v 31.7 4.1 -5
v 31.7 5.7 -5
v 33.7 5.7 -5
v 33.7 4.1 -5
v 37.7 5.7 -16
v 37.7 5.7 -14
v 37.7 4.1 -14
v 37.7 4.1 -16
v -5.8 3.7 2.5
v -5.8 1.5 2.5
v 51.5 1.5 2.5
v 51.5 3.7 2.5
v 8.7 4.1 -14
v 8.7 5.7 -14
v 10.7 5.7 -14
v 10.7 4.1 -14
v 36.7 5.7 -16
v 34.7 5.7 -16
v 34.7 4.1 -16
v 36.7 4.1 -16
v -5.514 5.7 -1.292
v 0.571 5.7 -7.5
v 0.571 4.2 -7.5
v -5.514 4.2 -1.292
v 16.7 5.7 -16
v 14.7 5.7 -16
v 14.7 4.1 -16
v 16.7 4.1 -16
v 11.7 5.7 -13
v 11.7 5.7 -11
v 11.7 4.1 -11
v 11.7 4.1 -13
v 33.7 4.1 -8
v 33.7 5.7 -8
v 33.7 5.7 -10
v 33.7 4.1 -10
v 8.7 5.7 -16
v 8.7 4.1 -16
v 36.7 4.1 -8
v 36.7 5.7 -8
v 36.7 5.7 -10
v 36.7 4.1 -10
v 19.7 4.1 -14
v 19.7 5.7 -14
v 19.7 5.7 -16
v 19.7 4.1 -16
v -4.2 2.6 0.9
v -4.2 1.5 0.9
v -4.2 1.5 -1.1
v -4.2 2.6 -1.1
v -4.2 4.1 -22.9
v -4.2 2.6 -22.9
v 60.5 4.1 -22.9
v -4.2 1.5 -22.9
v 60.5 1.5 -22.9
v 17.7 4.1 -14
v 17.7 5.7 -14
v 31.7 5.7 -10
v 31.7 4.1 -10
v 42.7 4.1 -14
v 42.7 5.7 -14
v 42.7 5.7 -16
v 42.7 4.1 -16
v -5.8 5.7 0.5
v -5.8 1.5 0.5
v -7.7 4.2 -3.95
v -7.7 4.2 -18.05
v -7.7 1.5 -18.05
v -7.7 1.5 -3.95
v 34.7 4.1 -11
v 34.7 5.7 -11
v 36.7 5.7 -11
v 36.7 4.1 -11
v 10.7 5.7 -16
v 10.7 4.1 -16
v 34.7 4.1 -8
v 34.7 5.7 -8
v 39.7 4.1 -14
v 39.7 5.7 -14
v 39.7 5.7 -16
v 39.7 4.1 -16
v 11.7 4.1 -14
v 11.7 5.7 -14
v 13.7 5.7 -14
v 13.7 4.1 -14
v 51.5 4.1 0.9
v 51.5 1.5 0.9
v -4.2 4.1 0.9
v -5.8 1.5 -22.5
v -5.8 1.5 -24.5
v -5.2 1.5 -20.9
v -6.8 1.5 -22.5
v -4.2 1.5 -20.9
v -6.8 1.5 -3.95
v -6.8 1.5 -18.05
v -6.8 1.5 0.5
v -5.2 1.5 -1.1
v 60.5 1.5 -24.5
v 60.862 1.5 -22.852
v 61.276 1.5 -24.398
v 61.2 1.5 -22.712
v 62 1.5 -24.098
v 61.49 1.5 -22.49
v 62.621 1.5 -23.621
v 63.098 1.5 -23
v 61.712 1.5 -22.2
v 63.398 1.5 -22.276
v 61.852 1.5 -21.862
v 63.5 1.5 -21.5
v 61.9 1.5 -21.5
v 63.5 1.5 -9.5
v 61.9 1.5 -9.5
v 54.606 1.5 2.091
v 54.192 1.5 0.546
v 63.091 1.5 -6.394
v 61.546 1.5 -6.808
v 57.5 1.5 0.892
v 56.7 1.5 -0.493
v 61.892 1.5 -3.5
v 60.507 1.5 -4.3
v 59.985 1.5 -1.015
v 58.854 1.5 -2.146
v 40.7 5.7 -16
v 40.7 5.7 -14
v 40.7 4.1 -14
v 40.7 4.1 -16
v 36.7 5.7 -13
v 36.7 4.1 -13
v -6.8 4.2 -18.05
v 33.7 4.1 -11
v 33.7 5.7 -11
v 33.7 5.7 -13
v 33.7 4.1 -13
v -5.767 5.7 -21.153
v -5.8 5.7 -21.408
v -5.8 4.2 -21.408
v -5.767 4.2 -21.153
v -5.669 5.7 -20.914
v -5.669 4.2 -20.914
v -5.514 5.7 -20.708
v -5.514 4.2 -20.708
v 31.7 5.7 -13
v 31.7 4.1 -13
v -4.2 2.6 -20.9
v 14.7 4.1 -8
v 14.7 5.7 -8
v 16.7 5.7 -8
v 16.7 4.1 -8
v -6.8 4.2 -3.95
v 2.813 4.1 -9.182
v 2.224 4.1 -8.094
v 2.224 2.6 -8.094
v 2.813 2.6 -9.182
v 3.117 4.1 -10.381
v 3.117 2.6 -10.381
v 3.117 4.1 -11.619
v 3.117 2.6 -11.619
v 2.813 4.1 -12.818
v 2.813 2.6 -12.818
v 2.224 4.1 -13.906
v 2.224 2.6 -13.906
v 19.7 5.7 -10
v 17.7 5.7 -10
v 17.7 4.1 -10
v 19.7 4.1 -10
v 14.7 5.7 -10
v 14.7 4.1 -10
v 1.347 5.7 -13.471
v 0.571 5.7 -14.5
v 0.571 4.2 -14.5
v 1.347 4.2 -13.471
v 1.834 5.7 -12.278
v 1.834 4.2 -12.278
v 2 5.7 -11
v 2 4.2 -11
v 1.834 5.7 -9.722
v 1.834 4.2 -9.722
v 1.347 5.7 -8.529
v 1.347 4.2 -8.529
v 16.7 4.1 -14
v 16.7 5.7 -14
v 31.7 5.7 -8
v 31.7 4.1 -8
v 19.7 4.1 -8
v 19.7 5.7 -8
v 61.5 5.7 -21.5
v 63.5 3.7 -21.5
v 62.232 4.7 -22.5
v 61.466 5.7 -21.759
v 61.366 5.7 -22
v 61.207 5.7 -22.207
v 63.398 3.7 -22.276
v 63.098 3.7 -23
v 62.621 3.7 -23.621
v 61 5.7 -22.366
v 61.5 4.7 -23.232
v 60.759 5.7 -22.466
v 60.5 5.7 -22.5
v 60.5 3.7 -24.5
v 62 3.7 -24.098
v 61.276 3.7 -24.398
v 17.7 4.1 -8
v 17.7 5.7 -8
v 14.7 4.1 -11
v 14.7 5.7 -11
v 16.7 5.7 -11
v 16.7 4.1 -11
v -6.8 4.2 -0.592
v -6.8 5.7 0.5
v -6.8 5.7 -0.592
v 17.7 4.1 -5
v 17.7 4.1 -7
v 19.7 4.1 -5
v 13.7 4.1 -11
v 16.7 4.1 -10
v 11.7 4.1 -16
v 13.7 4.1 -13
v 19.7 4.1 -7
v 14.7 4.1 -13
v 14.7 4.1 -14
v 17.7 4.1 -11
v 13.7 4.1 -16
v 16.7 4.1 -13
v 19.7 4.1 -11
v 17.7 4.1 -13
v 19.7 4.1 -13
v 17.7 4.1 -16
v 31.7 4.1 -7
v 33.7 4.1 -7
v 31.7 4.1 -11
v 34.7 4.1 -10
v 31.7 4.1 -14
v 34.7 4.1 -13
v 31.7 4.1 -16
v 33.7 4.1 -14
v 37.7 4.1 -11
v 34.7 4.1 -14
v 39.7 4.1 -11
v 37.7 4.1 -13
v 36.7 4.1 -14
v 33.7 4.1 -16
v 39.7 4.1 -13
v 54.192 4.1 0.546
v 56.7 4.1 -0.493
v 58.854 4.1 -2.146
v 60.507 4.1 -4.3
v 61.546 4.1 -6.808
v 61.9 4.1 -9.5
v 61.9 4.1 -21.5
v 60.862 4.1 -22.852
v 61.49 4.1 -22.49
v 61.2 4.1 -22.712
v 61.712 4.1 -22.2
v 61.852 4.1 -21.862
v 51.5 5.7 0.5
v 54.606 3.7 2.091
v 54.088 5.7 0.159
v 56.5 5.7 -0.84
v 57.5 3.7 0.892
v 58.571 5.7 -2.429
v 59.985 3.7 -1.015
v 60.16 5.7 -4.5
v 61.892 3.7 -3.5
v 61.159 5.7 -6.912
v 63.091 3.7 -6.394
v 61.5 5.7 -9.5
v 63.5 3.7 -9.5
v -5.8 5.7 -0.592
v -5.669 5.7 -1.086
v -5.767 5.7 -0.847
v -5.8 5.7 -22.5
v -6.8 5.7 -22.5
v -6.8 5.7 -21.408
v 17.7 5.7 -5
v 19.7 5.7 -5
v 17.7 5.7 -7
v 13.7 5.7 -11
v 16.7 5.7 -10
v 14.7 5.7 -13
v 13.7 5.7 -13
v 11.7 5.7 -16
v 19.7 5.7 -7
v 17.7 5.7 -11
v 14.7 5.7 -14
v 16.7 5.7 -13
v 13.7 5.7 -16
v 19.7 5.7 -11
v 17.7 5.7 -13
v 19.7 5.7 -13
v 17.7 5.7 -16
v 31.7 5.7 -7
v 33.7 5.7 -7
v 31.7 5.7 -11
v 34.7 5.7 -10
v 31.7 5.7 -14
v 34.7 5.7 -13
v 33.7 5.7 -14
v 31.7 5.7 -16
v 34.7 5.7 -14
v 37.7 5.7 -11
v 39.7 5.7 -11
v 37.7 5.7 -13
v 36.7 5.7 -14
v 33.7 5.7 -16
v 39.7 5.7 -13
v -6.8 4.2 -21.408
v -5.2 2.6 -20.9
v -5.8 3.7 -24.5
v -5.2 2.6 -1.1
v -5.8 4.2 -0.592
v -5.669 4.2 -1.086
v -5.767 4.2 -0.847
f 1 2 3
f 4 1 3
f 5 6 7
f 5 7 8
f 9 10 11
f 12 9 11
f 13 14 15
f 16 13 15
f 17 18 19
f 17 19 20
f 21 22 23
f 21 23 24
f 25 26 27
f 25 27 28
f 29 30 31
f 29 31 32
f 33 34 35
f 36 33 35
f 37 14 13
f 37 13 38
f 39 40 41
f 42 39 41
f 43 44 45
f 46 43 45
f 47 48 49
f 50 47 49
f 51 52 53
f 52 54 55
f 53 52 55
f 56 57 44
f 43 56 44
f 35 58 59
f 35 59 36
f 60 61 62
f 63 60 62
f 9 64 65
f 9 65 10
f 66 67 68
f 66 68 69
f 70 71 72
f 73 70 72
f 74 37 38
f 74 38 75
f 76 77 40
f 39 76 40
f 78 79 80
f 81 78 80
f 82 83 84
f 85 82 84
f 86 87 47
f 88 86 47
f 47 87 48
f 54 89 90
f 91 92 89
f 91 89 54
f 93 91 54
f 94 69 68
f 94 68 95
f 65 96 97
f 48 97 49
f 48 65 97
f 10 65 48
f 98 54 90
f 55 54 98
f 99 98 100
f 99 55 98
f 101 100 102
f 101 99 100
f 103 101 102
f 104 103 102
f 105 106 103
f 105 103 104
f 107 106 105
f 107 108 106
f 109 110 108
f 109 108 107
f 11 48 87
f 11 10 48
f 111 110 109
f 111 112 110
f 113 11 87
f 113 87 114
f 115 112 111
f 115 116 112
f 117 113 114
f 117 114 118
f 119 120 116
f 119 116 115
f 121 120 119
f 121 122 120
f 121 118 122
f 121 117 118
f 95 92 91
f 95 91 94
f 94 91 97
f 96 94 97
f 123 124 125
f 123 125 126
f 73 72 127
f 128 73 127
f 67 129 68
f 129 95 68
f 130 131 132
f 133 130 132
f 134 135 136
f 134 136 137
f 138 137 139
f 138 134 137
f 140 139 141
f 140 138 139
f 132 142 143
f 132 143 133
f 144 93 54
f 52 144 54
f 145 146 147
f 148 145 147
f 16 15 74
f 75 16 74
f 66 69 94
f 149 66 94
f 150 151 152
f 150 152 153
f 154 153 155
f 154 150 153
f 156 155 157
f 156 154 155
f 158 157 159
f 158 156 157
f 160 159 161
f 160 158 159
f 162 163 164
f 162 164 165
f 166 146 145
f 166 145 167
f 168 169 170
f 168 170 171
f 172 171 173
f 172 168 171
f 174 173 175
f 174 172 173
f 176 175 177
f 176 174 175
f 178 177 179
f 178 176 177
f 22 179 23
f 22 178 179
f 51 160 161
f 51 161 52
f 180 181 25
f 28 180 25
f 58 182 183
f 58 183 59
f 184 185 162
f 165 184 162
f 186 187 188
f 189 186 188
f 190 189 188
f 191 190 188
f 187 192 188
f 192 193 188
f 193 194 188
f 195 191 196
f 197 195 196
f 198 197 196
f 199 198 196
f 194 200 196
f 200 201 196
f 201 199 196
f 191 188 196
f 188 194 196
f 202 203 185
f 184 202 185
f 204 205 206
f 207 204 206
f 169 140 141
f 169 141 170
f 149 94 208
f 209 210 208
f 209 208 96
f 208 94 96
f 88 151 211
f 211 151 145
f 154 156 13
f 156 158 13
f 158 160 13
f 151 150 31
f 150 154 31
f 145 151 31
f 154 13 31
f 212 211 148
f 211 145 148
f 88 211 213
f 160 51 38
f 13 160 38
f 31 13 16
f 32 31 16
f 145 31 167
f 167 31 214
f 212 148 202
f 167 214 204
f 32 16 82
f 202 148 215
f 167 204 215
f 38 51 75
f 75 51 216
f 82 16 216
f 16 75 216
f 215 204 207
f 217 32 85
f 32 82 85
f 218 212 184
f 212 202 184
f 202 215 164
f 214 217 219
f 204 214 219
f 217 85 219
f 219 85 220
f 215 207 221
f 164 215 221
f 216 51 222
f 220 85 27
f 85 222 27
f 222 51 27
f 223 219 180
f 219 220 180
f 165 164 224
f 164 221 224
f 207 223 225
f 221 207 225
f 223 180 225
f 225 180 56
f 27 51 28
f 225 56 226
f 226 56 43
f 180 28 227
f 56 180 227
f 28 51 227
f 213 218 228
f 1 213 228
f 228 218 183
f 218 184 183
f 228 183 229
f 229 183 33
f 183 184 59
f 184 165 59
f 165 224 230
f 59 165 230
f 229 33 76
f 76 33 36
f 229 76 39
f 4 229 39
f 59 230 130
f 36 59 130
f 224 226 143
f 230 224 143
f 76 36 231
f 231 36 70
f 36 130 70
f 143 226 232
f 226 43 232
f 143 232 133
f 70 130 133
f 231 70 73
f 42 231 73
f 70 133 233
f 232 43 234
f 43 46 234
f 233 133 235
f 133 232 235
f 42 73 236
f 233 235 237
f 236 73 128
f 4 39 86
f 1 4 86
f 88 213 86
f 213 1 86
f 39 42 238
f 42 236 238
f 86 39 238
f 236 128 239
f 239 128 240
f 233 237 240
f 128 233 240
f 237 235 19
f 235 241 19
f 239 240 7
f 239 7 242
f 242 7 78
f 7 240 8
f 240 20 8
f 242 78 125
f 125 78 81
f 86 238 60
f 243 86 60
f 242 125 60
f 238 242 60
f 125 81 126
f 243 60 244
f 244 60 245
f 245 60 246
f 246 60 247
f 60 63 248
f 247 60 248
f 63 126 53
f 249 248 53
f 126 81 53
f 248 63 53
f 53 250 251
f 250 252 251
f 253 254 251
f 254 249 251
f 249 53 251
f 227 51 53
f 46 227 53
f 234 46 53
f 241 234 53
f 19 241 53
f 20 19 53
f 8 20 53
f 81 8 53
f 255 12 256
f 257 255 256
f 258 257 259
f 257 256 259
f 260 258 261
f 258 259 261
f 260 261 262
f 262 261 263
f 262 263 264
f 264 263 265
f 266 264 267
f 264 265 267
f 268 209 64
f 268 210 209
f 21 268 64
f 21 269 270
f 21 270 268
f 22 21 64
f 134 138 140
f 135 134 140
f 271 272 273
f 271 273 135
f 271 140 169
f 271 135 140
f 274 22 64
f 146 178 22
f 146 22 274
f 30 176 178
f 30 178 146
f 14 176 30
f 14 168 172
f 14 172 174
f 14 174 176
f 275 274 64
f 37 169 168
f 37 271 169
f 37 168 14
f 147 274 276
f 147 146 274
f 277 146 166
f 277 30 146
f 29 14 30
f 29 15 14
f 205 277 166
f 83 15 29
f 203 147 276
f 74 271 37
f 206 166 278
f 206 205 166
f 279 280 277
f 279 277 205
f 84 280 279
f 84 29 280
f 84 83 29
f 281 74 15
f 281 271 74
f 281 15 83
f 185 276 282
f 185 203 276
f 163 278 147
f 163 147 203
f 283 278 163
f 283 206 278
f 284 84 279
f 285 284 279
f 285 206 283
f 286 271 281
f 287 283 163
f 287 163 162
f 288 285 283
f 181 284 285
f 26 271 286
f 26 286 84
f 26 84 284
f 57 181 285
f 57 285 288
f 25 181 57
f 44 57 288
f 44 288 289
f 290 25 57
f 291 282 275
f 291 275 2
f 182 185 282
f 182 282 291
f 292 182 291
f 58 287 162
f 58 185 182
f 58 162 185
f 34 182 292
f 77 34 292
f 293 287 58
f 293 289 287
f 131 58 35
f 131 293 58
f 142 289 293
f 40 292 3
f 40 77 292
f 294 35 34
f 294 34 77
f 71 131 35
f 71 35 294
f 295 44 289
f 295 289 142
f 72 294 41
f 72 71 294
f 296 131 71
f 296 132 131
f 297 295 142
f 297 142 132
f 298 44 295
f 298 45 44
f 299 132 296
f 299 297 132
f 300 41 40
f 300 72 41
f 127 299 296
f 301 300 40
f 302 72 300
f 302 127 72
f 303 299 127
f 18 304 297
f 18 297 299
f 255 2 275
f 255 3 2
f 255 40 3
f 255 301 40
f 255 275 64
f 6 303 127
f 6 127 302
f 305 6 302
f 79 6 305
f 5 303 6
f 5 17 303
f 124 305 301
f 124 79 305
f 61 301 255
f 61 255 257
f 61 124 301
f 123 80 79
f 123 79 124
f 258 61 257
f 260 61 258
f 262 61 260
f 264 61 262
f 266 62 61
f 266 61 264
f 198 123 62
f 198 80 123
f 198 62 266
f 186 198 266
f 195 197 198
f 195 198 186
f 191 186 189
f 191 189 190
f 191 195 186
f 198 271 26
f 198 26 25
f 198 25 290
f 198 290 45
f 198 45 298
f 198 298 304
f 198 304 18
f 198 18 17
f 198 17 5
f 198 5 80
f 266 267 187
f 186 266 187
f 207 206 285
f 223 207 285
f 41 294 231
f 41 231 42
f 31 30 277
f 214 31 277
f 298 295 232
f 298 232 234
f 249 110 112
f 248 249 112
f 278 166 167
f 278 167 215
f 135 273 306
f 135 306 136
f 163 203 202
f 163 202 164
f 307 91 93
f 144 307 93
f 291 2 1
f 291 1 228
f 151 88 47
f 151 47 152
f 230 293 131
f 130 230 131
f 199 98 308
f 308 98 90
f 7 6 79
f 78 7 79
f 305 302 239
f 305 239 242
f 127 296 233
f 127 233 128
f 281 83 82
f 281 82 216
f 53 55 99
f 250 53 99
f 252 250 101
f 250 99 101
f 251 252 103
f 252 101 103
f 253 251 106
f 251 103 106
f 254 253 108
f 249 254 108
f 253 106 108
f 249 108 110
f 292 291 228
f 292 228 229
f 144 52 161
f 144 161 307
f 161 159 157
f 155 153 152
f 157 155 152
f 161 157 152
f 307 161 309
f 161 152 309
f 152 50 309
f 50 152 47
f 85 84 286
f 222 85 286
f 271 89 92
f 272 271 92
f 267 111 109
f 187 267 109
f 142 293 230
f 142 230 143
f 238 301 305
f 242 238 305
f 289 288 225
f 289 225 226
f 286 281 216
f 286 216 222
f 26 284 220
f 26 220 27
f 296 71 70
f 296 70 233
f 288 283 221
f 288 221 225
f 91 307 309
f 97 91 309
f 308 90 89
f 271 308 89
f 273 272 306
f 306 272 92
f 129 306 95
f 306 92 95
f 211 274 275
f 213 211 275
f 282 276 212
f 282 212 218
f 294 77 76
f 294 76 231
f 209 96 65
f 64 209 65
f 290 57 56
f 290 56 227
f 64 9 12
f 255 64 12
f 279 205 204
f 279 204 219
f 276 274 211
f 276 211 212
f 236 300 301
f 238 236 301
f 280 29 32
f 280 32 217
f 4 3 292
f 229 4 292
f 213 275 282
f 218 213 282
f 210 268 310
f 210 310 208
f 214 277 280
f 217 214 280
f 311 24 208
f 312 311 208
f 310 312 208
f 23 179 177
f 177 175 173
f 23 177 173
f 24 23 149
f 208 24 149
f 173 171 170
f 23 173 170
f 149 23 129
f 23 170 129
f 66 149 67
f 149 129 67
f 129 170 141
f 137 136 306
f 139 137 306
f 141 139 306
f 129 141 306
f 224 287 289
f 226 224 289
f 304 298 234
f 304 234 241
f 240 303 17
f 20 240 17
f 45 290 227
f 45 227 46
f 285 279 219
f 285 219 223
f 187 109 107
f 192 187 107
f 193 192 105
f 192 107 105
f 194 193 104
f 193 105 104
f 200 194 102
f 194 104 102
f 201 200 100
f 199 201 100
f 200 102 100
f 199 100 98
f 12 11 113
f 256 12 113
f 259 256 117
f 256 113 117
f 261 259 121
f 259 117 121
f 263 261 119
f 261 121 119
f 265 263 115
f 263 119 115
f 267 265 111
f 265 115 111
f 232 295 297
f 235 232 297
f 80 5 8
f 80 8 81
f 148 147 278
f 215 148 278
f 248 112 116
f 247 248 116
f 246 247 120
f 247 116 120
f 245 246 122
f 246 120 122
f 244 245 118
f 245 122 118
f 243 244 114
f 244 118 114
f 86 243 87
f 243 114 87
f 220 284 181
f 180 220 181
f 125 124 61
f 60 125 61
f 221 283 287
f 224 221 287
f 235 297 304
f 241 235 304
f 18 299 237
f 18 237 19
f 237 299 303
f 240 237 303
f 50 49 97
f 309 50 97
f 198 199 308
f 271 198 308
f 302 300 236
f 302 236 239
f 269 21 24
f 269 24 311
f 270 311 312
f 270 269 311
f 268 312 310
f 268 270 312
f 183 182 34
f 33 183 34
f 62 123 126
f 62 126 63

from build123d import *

# Parameters (mm, degrees)
EXTRUDE_1_DEPTH     = 4.2
EXTRUDE_START       = -1.6
EXTRUDE_2_DEPTH     = 1.6
CHAMFER_1_SIZE      = 2
CUT_EXTRUDE_1_DEPTH = 1.5
EXTRUDE_3_DEPTH     = 1.5
SKETCH_5_W          = 2.5
SKETCH_5_H          = 12.1
EXTRUDE_4_DEPTH     = 1.1
SKETCH_6_W          = 2
SKETCH_6_H          = 2
CUT_EXTRUDE_2_DEPTH = 69.191935007


with BuildPart() as part:
    # Эскиз1 → Бобышка-Вытянуть1 (new body)
    with BuildSketch(Plane(origin=(0, 1.5, 0), x_dir=(1, 0, 0), z_dir=(0, 1, 0))):
        with BuildLine():
            Line((46.05, -0.9), (-4.2, -0.9))
            Line((-4.2, -0.9), (-4.2, 1.1))
            Line((-4.2, 1.1), (-5.2, 1.1))
            Line((-5.2, 1.1), (-5.2, 4.95))
            Line((-5.2, 4.95), (-7.7, 4.95))
            Line((-7.7, 4.95), (-7.7, 3.95))
            Line((-7.7, 3.95), (-6.8, 3.95))
            Line((-6.8, 3.95), (-6.8, -0.5))
            Line((-6.8, -0.5), (-5.8, -0.5))
            Line((-5.8, -0.5), (-5.8, -2.5))
            Line((-5.8, -2.5), (46.05, -2.5))
            Line((46.05, -2.5), (50.55, -2.5))
            Line((50.55, -2.5), (51.5, -2.5))
            ThreePointArc((51.5, -2.5), (59.985281374, 1.014718626), (63.5, 9.5))
            Line((63.5, 9.5), (63.5, 21.5))
            ThreePointArc((63.5, 21.5), (62.621320344, 23.621320344), (60.5, 24.5))
            Line((60.5, 24.5), (-5.8, 24.5))
            Line((-5.8, 24.5), (-5.8, 22.5))
            Line((-5.8, 22.5), (-6.8, 22.5))
            Line((-6.8, 22.5), (-6.8, 18.05))
            Line((-6.8, 18.05), (-7.7, 18.05))
            Line((-7.7, 18.05), (-7.7, 17.05))
            Line((-7.7, 17.05), (-5.2, 17.05))
            Line((-5.2, 17.05), (-5.2, 20.9))
            Line((-5.2, 20.9), (-4.2, 20.9))
            Line((-4.2, 20.9), (-4.2, 22.9))
            Line((-4.2, 22.9), (60.5, 22.9))
            ThreePointArc((60.5, 22.9), (61.489949494, 22.489949494), (61.9, 21.5))
            Line((61.9, 21.5), (61.9, 9.5))
            ThreePointArc((61.9, 9.5), (58.853910524, 2.146089476), (51.5, -0.9))
            Line((51.5, -0.9), (50.55, -0.9))
            Line((50.55, -0.9), (46.05, -0.9))
        make_face()
    extrude(amount=EXTRUDE_1_DEPTH)

    # Эскиз2 → Бобышка-Вытянуть2 (add)
    with BuildSketch(Plane(origin=(0, 5.7, 0), x_dir=(1, 0, 0), z_dir=(0, 1, 0)).offset(EXTRUDE_START)):
        with BuildLine():
            Line((-7.7, 17.05), (-7.7, 4.95))
            Line((-7.7, 4.95), (-7.7, 3.95))
            Line((-7.7, 3.95), (-6.8, 3.95))
            Line((-6.8, 3.95), (-6.8, -0.5))
            Line((-6.8, -0.5), (-5.8, -0.5))
            Line((-5.8, -0.5), (-5.8, -2.5))
            Line((-5.8, -2.5), (51.5, -2.5))
            ThreePointArc((51.5, -2.5), (59.985281374, 1.014718626), (63.5, 9.5))
            Line((63.5, 9.5), (63.5, 21.5))
            ThreePointArc((63.5, 21.5), (62.621320344, 23.621320344), (60.5, 24.5))
            Line((60.5, 24.5), (-5.8, 24.5))
            Line((-5.8, 24.5), (-5.8, 22.5))
            Line((-5.8, 22.5), (-6.8, 22.5))
            Line((-6.8, 22.5), (-6.8, 18.05))
            Line((-6.8, 18.05), (-7.7, 18.05))
            Line((-7.7, 18.05), (-7.7, 17.05))
        make_face()
    extrude(amount=EXTRUDE_2_DEPTH)

    # Фаска1
    chamfer_1_edges = [part.edges().sort_by_distance(p)[0] for p in [
        (27.35, 5.7, -24.5),
        (62.621320344, 5.7, -23.621320344),
        (63.5, 5.7, -15.5),
        (59.985281374, 5.7, -1.014718626),
        (22.85, 5.7, 2.5),
    ]]
    chamfer(chamfer_1_edges, length=CHAMFER_1_SIZE)

    # Эскиз3 → Вырез-Вытянуть1 (cut)
    with BuildSketch(Plane(origin=(0, 5.7, 0), x_dir=(1, 0, 0), z_dir=(0, 1, 0))):
        with BuildLine():
            Line((0.570791566, 7.5), (-5.514169361, 1.291627678))
            ThreePointArc((-5.514169361, 1.291627678), (-5.72578868, 0.969696159), (-5.8, 0.591654733))
            Line((-5.8, 0.591654733), (-11.525705964, 0.591654733))
            Line((-11.525705964, 0.591654733), (-11.525705964, 21.408345267))
            Line((-11.525705964, 21.408345267), (-5.8, 21.408345267))
            ThreePointArc((-5.8, 21.408345267), (-5.72578868, 21.030303841), (-5.514169361, 20.708372322))
            Line((-5.514169361, 20.708372322), (0.570791566, 14.5))
            ThreePointArc((0.570791566, 14.5), (2, 11), (0.570791566, 7.5))
        make_face()
    extrude(amount=-CUT_EXTRUDE_1_DEPTH, mode=Mode.SUBTRACT)

    # Эскиз4 → Бобышка-Вытянуть3 (add)
    with BuildSketch(Plane.XZ.offset(-4.1)):
        with BuildLine():
            Line((-4.2, 0.9), (2.224149308, -8.093809031))
            ThreePointArc((2.224149308, -8.093809031), (3.155481952, -11), (2.224149308, -13.906190969))
            Line((2.224149308, -13.906190969), (-4.2, -22.9))
            Line((-4.2, -22.9), (-5.2, -22.9))
            Line((-5.2, -22.9), (-5.2, -17.05))
            Line((-5.2, -17.05), (-7.7, -17.05))
            Line((-7.7, -17.05), (-7.7, -4.95))
            Line((-7.7, -4.95), (-5.998027876, -4.95))
            Line((-5.998027876, -4.95), (-5.2, -1.1))
            Line((-5.2, -1.1), (-4.2, 0.9))
        make_face()
    extrude(amount=EXTRUDE_3_DEPTH)

    # Эскиз5 → Бобышка-Вытянуть4 (add)
    with BuildSketch(Plane.XZ.offset(-2.6)):
        with Locations((-6.45, -11)):
            Rectangle(SKETCH_5_W, SKETCH_5_H)
    extrude(amount=EXTRUDE_4_DEPTH)

    # Эскиз6 → Вырез-Вытянуть2 (cut, through all)
    with BuildSketch(Plane(origin=(0, 5.7, 0), x_dir=(1, 0, 0), z_dir=(0, 1, 0))):
        with Locations((18.7, 15)):
            Rectangle(SKETCH_6_W, SKETCH_6_H)
        with Locations((15.7, 15)):
            Rectangle(SKETCH_6_W, SKETCH_6_H)
        with Locations((12.7, 15)):
            Rectangle(SKETCH_6_W, SKETCH_6_H)
        with Locations((9.7, 15)):
            Rectangle(SKETCH_6_W, SKETCH_6_H)
        with Locations((18.7, 12)):
            Rectangle(SKETCH_6_W, SKETCH_6_H)
        with Locations((15.7, 12)):
            Rectangle(SKETCH_6_W, SKETCH_6_H)
        with Locations((12.7, 12)):
            Rectangle(SKETCH_6_W, SKETCH_6_H)
        with Locations((18.7, 9)):
            Rectangle(SKETCH_6_W, SKETCH_6_H)
        with Locations((15.7, 9)):
            Rectangle(SKETCH_6_W, SKETCH_6_H)
        with Locations((18.7, 6)):
            Rectangle(SKETCH_6_W, SKETCH_6_H)
        with Locations((32.7, 6)):
            Rectangle(SKETCH_6_W, SKETCH_6_H)
        with Locations((35.7, 9)):
            Rectangle(SKETCH_6_W, SKETCH_6_H)
        with Locations((32.7, 9)):
            Rectangle(SKETCH_6_W, SKETCH_6_H)
        with Locations((38.7, 12)):
            Rectangle(SKETCH_6_W, SKETCH_6_H)
        with Locations((35.7, 12)):
            Rectangle(SKETCH_6_W, SKETCH_6_H)
        with Locations((32.7, 12)):
            Rectangle(SKETCH_6_W, SKETCH_6_H)
        with Locations((41.7, 15)):
            Rectangle(SKETCH_6_W, SKETCH_6_H)
        with Locations((38.7, 15)):
            Rectangle(SKETCH_6_W, SKETCH_6_H)
        with Locations((35.7, 15)):
            Rectangle(SKETCH_6_W, SKETCH_6_H)
        with Locations((32.7, 15)):
            Rectangle(SKETCH_6_W, SKETCH_6_H)
    extrude(amount=-CUT_EXTRUDE_2_DEPTH, mode=Mode.SUBTRACT)


solid = part.part
